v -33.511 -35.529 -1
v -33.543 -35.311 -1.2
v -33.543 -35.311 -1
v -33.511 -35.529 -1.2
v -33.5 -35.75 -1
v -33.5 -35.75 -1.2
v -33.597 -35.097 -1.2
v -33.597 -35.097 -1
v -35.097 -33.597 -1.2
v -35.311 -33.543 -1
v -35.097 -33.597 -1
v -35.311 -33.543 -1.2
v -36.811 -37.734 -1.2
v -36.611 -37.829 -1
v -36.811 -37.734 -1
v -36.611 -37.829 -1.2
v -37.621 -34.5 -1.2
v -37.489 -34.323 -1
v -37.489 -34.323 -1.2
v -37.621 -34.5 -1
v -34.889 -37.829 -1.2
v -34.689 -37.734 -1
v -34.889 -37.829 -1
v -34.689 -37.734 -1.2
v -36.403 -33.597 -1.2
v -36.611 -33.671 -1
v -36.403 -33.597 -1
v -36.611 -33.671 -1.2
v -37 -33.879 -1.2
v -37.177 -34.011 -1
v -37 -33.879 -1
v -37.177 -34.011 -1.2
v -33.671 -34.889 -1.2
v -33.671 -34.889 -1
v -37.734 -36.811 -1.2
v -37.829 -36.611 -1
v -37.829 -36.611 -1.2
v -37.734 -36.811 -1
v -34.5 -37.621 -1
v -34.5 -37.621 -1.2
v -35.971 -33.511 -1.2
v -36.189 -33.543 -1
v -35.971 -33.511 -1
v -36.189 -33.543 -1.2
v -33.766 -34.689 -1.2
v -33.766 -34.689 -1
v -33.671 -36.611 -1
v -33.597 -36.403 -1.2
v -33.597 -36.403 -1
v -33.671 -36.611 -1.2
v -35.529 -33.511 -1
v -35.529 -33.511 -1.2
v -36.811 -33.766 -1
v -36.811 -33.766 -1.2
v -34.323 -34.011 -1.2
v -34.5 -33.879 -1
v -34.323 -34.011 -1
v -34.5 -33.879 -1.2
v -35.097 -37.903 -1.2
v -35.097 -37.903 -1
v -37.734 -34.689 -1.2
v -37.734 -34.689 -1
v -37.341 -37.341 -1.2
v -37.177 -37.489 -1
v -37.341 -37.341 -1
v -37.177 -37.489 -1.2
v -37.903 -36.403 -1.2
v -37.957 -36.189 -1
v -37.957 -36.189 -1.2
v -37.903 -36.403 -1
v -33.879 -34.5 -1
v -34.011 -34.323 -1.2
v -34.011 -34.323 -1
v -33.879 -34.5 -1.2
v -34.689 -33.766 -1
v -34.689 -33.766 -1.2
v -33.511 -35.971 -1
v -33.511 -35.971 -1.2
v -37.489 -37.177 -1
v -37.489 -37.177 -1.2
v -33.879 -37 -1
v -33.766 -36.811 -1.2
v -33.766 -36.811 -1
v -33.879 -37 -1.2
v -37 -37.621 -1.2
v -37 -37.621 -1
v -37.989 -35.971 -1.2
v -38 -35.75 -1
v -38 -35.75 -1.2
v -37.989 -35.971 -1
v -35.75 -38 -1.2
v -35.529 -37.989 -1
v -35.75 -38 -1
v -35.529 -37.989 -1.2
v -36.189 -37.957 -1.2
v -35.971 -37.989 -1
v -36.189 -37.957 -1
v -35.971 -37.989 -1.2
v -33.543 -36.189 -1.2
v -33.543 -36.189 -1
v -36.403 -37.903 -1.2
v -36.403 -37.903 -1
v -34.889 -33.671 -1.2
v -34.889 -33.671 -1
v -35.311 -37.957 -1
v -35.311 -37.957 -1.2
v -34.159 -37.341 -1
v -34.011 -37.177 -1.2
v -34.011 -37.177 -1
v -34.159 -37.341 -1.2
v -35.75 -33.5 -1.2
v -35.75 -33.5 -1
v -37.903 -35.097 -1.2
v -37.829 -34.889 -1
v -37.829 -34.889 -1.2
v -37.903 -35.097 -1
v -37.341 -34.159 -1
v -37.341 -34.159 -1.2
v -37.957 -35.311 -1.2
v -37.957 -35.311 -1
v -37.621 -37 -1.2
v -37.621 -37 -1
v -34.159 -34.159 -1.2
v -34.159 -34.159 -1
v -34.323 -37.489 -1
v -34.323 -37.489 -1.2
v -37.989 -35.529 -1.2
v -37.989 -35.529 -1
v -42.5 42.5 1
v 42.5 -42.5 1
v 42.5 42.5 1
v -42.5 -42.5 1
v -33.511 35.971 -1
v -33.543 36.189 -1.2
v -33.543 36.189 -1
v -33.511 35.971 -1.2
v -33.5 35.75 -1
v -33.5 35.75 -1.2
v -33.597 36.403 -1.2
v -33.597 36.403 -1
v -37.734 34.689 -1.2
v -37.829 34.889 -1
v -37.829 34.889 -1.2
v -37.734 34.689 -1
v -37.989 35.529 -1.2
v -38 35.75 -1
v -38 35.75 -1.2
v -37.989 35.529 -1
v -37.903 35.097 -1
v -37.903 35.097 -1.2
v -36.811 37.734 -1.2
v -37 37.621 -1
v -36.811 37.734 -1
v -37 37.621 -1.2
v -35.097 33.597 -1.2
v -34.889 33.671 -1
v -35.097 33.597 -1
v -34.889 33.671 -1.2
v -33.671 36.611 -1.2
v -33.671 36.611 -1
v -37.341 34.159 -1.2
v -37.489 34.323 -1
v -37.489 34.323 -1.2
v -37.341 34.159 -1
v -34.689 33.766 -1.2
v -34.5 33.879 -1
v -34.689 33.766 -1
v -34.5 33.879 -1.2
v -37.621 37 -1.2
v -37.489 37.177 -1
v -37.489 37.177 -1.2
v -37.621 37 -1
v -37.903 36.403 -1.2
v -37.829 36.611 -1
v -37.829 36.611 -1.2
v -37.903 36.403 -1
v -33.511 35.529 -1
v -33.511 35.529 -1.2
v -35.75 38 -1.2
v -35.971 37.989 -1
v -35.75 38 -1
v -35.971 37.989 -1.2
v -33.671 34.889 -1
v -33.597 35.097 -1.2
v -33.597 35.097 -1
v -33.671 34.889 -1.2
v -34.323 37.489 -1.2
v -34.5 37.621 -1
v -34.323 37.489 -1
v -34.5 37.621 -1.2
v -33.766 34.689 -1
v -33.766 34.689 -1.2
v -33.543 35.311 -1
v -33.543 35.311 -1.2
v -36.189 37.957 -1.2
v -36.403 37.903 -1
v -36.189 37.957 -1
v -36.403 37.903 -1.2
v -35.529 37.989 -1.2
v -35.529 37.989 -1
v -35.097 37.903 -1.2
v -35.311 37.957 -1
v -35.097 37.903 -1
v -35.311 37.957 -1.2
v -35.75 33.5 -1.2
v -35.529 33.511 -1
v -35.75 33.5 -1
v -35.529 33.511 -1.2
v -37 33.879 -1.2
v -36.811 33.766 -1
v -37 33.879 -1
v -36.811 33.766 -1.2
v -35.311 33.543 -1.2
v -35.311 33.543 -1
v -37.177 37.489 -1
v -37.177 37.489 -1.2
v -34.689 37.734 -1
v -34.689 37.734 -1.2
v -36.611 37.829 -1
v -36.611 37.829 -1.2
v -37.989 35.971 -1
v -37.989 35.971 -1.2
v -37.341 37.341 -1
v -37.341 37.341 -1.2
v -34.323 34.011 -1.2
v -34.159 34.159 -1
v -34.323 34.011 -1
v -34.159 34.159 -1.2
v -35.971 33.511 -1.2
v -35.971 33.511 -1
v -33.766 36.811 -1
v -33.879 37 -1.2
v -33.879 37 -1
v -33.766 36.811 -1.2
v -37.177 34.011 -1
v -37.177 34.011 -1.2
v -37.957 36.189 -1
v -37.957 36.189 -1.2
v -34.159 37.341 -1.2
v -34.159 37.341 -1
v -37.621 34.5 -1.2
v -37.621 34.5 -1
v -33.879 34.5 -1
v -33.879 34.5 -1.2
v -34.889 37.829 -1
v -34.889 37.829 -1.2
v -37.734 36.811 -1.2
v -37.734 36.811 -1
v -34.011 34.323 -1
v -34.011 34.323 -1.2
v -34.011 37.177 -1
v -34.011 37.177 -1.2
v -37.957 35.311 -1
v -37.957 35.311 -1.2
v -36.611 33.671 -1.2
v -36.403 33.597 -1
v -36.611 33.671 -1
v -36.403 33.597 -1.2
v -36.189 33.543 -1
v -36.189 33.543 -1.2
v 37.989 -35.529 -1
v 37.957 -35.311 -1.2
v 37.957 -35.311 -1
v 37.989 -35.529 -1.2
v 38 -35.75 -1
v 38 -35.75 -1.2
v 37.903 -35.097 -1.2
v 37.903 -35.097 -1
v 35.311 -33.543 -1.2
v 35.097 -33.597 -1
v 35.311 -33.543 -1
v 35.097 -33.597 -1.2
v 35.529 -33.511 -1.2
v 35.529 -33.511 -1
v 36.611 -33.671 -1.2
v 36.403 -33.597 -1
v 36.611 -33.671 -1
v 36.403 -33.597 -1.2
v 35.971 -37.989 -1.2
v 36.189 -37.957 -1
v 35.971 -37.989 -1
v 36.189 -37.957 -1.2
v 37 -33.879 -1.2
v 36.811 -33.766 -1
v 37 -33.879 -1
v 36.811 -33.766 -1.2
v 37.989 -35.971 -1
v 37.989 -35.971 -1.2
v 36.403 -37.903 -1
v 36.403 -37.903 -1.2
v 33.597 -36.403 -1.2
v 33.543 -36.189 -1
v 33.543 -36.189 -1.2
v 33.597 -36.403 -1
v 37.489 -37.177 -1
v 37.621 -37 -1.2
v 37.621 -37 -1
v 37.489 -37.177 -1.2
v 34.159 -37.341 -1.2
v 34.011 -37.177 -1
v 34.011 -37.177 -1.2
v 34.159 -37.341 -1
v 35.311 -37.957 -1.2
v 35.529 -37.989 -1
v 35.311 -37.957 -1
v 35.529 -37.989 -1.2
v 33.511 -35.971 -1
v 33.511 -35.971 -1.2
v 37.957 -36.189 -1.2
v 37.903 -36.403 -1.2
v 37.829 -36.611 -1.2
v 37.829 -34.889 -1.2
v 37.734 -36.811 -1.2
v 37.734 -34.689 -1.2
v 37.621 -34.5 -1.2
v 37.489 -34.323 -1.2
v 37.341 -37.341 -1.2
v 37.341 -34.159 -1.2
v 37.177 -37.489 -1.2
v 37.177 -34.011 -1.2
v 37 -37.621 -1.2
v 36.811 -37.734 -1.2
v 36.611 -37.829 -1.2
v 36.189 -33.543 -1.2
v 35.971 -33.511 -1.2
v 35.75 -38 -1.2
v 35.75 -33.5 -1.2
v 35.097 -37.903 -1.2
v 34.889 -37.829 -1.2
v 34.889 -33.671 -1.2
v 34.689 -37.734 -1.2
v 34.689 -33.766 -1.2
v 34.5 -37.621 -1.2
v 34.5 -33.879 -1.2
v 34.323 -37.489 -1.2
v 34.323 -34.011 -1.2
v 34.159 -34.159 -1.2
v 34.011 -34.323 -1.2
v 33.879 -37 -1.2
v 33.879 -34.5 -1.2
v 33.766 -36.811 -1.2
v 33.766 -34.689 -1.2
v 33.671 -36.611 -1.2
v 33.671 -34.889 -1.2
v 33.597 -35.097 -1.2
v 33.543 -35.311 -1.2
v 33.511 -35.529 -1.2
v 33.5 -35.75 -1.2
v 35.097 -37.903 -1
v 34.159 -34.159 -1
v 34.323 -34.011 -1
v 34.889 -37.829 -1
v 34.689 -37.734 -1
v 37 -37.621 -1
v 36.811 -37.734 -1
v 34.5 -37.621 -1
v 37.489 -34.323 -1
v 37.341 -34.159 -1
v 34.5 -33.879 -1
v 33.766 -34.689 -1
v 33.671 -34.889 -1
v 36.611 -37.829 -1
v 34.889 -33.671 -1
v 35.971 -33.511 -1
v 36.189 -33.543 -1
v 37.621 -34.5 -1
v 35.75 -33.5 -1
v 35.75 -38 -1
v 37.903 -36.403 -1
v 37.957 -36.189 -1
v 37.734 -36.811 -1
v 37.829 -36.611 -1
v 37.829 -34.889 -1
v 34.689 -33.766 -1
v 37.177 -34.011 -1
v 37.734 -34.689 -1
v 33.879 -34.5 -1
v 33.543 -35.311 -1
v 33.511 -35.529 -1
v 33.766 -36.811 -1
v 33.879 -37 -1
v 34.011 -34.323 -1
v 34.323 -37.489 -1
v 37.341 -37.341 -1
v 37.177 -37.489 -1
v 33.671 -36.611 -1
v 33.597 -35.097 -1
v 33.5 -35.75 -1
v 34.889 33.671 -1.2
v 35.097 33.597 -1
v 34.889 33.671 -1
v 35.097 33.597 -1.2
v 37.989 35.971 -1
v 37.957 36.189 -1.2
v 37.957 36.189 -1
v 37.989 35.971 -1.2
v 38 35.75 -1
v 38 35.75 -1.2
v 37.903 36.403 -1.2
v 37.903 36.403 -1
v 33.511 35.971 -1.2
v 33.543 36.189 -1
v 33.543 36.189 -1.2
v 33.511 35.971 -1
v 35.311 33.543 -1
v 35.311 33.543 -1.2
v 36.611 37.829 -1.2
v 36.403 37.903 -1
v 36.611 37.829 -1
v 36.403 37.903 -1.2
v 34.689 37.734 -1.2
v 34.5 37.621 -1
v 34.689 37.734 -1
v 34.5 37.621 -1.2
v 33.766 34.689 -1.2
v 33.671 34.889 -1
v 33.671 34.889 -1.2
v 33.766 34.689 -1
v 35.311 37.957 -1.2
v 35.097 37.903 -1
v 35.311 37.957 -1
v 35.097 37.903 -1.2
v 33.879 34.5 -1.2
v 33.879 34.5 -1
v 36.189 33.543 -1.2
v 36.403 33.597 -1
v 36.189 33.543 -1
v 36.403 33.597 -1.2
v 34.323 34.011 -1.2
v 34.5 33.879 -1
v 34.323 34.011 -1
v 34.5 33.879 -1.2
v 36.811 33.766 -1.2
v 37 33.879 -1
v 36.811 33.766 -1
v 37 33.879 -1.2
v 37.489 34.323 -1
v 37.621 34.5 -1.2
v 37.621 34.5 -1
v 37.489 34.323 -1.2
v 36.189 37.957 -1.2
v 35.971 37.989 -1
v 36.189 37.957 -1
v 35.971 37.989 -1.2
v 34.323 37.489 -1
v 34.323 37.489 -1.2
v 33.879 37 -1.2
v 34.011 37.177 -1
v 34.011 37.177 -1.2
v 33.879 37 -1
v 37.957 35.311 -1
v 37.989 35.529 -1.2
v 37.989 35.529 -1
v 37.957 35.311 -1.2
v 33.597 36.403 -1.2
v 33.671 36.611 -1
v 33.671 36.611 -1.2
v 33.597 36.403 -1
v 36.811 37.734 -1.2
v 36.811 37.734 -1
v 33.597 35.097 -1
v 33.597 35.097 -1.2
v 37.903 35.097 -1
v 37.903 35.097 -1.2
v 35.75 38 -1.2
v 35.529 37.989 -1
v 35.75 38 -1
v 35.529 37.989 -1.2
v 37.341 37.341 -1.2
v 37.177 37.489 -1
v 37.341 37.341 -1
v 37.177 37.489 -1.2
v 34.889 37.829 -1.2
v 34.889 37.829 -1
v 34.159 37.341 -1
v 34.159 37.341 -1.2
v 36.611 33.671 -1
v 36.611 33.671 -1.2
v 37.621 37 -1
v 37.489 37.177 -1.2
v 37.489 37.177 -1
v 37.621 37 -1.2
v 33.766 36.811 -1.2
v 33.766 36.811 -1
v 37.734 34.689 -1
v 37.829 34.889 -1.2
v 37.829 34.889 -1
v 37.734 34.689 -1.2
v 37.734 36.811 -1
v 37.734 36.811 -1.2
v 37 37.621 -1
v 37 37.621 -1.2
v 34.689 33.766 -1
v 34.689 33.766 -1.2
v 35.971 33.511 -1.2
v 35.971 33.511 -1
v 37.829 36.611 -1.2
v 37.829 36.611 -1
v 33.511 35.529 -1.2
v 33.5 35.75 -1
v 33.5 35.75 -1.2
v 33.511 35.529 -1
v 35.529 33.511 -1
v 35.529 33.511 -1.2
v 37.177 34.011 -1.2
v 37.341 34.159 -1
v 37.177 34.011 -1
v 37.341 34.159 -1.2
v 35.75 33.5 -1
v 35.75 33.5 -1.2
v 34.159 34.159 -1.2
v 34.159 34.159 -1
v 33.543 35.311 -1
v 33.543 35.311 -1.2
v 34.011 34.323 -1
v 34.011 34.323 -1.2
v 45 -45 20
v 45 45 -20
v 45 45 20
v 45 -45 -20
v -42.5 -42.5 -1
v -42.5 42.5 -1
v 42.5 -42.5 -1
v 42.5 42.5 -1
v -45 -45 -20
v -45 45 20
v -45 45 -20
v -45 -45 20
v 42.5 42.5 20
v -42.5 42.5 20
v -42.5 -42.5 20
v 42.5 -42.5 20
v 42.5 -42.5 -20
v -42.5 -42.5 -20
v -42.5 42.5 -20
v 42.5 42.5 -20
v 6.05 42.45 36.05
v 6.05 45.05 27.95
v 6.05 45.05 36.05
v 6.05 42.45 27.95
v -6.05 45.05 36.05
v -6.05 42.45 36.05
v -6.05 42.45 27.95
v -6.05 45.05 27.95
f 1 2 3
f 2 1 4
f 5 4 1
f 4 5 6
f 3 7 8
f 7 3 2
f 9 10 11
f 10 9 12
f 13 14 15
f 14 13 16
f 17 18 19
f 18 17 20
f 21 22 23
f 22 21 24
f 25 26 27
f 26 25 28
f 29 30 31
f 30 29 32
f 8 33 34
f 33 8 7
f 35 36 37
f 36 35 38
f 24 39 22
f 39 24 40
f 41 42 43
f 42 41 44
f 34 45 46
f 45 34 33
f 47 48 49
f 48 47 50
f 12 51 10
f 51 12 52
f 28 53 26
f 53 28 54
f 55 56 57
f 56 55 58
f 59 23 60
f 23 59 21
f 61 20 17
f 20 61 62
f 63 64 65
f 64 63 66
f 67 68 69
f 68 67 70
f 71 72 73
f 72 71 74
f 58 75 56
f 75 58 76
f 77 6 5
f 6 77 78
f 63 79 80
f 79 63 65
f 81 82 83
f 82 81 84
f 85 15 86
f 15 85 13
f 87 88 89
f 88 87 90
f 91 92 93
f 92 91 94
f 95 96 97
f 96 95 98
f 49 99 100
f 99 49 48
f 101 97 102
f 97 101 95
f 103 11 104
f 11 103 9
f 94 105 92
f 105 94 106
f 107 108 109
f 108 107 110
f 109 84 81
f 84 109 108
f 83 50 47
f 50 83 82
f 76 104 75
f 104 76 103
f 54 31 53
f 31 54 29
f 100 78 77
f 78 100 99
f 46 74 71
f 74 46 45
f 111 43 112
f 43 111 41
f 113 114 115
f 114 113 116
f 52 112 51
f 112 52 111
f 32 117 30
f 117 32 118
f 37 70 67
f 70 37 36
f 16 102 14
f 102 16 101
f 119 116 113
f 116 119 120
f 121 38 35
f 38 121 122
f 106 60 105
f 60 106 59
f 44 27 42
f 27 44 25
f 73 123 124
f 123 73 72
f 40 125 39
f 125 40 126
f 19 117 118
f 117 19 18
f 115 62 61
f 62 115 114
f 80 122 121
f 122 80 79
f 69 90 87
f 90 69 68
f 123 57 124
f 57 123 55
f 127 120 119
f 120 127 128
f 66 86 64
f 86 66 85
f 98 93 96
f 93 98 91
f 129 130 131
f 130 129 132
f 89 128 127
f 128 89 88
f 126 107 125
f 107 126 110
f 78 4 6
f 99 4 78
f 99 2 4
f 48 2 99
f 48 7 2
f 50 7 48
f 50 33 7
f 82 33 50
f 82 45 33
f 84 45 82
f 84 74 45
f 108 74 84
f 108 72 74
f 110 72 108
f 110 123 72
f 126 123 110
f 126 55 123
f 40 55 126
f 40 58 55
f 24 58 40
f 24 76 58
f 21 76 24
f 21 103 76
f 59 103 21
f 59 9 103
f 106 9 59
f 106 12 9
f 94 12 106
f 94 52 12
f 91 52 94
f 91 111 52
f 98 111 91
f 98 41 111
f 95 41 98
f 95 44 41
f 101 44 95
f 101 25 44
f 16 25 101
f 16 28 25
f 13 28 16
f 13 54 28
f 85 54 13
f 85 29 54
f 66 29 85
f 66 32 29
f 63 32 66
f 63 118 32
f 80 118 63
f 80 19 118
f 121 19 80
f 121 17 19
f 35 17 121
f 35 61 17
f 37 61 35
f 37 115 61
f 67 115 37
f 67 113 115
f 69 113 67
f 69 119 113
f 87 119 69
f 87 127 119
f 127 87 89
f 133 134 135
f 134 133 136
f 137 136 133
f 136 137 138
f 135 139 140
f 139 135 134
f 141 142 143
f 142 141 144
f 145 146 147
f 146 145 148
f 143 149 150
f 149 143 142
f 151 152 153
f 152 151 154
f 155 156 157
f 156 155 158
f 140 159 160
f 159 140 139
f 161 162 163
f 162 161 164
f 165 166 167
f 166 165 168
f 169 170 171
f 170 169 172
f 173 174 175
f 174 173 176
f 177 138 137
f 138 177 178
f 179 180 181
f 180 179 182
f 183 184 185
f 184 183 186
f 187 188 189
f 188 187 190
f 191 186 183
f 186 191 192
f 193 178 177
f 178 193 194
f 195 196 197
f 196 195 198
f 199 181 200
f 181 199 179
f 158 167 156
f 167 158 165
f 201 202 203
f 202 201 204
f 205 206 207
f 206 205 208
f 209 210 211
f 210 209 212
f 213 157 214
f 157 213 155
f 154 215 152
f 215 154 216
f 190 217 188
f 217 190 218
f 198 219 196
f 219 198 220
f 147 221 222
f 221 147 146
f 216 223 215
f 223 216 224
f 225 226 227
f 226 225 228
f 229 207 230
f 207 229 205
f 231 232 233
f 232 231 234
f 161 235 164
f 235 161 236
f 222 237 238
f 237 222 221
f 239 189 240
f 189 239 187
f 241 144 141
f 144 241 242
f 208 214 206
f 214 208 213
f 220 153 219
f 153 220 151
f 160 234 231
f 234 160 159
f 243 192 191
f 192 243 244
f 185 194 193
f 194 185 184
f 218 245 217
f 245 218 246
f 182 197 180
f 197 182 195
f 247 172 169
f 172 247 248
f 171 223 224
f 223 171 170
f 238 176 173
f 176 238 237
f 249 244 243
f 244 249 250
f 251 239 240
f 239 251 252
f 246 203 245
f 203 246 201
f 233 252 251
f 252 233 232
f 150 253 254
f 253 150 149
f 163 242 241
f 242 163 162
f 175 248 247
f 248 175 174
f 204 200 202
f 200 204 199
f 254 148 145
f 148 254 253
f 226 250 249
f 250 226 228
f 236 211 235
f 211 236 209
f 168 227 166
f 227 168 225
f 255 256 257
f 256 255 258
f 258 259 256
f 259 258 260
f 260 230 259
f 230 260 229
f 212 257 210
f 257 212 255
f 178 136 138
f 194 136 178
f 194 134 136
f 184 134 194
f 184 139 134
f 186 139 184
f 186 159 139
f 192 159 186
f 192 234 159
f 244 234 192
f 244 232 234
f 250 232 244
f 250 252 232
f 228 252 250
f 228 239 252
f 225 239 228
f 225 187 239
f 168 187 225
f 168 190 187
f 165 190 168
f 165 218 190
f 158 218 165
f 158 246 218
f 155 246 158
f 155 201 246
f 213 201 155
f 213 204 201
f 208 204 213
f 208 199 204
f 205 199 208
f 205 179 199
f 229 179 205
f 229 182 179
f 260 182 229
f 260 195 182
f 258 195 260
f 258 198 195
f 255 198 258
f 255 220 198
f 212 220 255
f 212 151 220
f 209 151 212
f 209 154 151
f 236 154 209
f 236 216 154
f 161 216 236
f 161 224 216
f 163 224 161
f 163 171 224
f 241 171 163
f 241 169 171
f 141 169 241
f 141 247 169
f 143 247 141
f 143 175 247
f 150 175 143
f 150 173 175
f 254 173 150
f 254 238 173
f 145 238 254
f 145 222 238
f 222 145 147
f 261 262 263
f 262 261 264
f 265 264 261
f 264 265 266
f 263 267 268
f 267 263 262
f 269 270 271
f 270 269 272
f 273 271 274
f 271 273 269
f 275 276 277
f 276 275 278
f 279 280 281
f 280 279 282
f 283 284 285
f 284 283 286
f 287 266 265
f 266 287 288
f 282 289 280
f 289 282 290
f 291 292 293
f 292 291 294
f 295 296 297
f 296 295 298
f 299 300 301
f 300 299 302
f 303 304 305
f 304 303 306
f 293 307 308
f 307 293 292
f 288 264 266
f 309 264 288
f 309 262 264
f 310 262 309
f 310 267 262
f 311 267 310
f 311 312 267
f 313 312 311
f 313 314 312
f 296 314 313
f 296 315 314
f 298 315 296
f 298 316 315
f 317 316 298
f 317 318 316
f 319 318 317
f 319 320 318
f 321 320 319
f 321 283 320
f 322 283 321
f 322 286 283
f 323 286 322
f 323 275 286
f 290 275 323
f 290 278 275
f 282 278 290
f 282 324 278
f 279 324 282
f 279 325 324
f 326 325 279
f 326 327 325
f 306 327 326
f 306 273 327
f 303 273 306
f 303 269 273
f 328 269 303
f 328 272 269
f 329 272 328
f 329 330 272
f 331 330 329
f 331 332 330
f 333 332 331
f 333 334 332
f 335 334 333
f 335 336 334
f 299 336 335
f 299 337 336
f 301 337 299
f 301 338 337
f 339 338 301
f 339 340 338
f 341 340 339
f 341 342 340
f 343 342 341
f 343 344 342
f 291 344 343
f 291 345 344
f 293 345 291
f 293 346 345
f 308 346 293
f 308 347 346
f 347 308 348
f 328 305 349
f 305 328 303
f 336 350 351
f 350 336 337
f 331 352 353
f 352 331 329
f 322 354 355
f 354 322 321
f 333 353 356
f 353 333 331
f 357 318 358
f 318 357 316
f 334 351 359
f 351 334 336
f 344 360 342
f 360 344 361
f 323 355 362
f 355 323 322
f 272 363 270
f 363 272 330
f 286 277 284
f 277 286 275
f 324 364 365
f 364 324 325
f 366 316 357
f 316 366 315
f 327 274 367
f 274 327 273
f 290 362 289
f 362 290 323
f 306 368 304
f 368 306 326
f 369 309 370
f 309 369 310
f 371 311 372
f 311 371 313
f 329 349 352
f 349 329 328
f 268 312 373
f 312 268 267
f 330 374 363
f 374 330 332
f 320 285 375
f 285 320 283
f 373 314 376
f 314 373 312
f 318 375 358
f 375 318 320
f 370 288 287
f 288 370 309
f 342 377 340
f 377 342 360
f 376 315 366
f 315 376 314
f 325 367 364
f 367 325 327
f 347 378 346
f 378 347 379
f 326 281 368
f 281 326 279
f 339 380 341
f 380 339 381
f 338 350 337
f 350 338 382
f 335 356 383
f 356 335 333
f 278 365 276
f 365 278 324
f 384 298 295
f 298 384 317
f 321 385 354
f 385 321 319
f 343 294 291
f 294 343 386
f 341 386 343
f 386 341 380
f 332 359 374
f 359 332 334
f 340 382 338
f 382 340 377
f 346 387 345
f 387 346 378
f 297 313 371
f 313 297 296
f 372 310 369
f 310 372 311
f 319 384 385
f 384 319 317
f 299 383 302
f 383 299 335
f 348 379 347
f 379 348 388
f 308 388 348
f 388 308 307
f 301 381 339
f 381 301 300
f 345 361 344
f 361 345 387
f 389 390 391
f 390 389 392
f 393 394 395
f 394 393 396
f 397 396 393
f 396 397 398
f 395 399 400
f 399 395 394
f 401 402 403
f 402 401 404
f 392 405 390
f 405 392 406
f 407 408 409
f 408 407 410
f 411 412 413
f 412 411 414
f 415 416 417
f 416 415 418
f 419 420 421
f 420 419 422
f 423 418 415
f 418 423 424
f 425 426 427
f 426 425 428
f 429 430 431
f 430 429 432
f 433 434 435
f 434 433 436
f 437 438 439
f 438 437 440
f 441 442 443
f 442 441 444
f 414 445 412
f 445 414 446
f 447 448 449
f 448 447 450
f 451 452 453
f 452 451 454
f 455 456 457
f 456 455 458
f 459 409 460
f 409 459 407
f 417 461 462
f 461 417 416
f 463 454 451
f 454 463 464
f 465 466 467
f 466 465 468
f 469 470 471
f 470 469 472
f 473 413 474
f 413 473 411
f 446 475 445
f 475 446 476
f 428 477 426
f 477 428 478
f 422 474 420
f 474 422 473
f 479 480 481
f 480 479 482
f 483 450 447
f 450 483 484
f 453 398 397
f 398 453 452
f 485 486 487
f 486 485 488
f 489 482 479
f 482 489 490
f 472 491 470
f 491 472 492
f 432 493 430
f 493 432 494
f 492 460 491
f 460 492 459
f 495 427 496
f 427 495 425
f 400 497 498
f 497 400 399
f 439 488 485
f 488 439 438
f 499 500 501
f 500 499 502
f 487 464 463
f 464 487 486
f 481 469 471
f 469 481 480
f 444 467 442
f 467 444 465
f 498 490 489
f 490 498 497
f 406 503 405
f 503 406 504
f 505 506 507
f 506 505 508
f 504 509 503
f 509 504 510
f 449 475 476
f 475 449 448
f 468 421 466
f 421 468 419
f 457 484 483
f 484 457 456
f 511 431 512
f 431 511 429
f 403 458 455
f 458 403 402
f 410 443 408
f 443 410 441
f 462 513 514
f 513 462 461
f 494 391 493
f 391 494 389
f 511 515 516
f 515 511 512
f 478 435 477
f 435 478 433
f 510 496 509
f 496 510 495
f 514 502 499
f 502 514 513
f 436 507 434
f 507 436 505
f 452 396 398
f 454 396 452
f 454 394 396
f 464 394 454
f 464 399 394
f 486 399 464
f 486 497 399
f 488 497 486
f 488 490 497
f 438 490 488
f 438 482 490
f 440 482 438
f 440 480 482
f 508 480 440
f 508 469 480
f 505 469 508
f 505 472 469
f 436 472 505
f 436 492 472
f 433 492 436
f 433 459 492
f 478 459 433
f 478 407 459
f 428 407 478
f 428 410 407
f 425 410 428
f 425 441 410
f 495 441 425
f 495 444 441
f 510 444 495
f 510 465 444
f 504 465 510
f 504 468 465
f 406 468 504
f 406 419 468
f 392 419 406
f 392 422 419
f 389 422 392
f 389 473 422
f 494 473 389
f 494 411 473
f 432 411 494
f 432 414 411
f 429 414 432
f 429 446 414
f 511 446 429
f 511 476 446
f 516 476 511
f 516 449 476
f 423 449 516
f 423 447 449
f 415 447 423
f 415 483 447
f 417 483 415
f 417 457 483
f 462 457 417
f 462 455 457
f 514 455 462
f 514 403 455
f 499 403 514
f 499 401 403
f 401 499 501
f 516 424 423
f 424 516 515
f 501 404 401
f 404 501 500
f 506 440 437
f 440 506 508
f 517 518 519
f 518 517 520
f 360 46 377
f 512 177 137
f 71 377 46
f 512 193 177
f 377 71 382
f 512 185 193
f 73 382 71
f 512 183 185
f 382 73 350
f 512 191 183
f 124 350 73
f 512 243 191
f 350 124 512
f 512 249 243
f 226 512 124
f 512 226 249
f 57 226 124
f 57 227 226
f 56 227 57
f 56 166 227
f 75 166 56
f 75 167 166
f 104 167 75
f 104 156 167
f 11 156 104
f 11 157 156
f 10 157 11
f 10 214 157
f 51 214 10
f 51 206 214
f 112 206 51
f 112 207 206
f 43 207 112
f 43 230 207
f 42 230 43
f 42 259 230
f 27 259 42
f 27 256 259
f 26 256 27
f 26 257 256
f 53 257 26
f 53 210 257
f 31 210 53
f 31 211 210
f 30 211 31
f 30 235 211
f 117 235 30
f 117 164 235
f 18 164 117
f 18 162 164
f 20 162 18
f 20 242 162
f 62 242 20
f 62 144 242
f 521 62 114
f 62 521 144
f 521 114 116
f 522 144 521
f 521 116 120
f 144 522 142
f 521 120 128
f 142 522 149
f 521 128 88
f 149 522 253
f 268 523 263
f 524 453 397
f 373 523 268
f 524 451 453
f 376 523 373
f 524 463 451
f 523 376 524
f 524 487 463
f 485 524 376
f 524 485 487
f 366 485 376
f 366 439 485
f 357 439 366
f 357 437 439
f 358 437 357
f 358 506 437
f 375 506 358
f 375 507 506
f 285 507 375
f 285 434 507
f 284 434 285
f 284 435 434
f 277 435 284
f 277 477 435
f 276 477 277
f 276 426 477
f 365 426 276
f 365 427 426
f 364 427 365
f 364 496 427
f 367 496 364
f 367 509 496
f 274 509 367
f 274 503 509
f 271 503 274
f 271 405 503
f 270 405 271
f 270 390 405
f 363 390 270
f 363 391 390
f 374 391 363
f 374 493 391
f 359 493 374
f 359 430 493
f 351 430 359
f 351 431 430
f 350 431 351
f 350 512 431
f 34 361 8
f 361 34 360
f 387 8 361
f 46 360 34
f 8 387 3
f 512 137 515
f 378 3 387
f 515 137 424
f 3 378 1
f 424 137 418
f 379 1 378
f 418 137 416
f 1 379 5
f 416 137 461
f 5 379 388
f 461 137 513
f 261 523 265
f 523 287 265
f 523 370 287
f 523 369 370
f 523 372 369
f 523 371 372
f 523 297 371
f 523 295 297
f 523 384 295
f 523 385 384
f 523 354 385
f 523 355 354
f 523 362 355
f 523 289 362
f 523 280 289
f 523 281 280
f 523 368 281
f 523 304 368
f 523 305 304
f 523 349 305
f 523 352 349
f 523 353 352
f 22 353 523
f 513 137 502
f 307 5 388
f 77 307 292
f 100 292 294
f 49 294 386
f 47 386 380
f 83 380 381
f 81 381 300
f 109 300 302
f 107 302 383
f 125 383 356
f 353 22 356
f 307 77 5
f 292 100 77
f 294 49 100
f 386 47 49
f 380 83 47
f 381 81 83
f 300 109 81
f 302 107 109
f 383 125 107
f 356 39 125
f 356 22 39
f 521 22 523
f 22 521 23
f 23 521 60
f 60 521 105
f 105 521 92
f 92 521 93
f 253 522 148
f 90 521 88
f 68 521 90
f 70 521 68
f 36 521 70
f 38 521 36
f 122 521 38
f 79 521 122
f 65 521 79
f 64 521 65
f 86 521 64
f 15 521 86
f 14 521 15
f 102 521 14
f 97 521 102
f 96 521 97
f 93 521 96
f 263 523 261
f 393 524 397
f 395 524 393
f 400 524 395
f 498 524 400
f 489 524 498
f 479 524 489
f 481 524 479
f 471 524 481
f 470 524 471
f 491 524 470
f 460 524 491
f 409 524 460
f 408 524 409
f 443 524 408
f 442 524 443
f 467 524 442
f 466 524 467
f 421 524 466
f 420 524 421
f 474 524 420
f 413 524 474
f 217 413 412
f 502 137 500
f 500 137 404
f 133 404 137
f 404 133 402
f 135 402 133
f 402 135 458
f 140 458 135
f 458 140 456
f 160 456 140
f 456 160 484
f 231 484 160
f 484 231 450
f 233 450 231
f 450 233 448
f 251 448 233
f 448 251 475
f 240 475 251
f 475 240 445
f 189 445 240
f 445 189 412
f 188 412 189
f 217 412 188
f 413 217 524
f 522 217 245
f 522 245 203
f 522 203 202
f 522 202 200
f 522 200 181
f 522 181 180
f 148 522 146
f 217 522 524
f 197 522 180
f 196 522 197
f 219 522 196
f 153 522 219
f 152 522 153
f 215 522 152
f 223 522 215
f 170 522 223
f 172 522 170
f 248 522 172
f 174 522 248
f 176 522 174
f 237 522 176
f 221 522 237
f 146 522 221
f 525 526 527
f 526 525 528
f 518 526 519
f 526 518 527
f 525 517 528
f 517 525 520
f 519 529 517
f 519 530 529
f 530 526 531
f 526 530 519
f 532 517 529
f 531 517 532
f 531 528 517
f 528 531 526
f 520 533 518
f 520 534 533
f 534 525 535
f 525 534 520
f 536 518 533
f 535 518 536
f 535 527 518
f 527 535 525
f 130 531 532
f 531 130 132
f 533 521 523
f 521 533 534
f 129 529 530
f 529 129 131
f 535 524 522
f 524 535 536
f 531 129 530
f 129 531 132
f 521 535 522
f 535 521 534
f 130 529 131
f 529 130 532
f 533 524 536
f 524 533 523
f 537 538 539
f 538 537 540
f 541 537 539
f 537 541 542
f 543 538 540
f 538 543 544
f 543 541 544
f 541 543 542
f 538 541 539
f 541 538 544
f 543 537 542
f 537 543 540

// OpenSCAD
// Dimensions for DIY magnetic stirrer housing
$fn = 64;

// Overall dimensions
outer_width = 90;        // X dimension
outer_depth = 90;        // Y dimension
top_thickness = 2;       // Z thickness of top plate
wall_height = 40;         // Height of walls from top plate
wall_thickness = 2.5;      // Thickness of side walls

// Screw hole parameters
screw_diameter = 4.5;      // Diameter of screw holes
screw_pattern_diameter = 71.5; // Diagonal distance between screw holes (square pattern)

// Cable notch parameters
notch_width = 12;         // Width of cable notch
notch_depth = 8;          // Depth of notch from open edge (z = 32 to z = 40)
notch_position = 45;        // Center of notch along the wall (Y direction)

// Calculate center of top plate
plate_center_x = outer_width / 2;
plate_center_y = outer_depth / 2;

// Calculate screw hole positions (on a square pattern)
screw_offset = screw_pattern_diameter / 2;

// Define the housing as a top plate with walls and features
module housing() {
    // Top plate (z = 0 to 2)
    translate([0, 0, 0])
        cube([outer_width, outer_depth, top_thickness], center = true);

    // Four walls (2.5 mm thick) rising from top plate
    // Front wall (Y = -45 to -45 + wall_thickness) and back wall (Y = 45 - wall_thickness to 45)
    // Left wall (X = -45 to -45 + wall_thickness) and right wall (X = 45 - wall_thickness to 45)

    // Front wall (Y = -45 to -45 + wall_thickness, Z = 0 to 40)
    translate([0, -45 + wall_thickness/2, 0])
        cube([outer_width, wall_thickness, wall_height], center = true);

    // Back wall (Y = 45 - wall_thickness to 45, Z = 0 to 40)
    translate([0, 45 - wall_thickness/2, 0])
        cube([outer_width, wall_thickness, wall_height], center = true);

    // Left wall (X = -45 to -45 + wall_thickness, Z = 0 to 40)
    translate([-45 + wall_thickness/2, 0, 0])
        cube([wall_thickness, outer_depth, wall_height], center = true);

    // Right wall (X = 45 - wall_thickness to 45, Z = 0 to 40)
    translate([45 - wall_thickness/2, 0, 0])
        cube([wall_thickness, outer_depth, wall_height], center = true);

    // Cut screw holes through top plate (z = 0 to 2) using cylinders
    for (i = [0:1]) {
        for (j = [0:1]) {
            // Two screws on each diagonal: (i,j) = (0,0): bottom-left, (0,1): bottom-right, etc.
            // Screw positions: (±screw_offset, ±screw_offset)
            screw_x = (i == 0 ? -screw_offset : screw_offset);
            screw_y = (j == 0 ? -screw_offset : screw_offset);

            translate([screw_x, screw_y, -0.1]) // -0.1 to ensure full penetration through top plate
                cylinder(h = top_thickness + 0.2, r = screw_diameter / 2, center = true);
        }
    }

    // Cut cable notch in the back wall (Y = 45 - wall_thickness to 45)
    // Notch is 12 mm wide, centered along Y, from z = 32 to z = 40 (8 mm deep)
    // Position: X = -45 to 45 (full X span), Y = 45 - wall_thickness to 45, Z = 32 to 40
    // But we cut a rectangular hole in the back wall

    // Define notch dimensions: centered on Y = 45 - wall_thickness/2, but we need to cut from Y = 45 - wall_thickness to 45
    // So we cut a rectangle in the back wall from Y = 45 - wall_thickness to 45, X = -45 to 45, Z = 32 to 40
    // But we want a notch that is 12 mm wide in X, centered at X = 0

    notch_x_min = -notch_width / 2;
    notch_x_max = notch_width / 2;
    notch_y_min = 45 - wall_thickness;
    notch_y_max = 45;
    notch_z_min = 32;
    notch_z_max = 40;

    // Cut notch using a cube that extends slightly beyond the wall
    translate([0, 45 - wall_thickness/2, 32])
        cube([notch_width + 0.1, wall_thickness + 0.1, notch_depth + 0.1], center = true);
}

// Render the housing
housing();
